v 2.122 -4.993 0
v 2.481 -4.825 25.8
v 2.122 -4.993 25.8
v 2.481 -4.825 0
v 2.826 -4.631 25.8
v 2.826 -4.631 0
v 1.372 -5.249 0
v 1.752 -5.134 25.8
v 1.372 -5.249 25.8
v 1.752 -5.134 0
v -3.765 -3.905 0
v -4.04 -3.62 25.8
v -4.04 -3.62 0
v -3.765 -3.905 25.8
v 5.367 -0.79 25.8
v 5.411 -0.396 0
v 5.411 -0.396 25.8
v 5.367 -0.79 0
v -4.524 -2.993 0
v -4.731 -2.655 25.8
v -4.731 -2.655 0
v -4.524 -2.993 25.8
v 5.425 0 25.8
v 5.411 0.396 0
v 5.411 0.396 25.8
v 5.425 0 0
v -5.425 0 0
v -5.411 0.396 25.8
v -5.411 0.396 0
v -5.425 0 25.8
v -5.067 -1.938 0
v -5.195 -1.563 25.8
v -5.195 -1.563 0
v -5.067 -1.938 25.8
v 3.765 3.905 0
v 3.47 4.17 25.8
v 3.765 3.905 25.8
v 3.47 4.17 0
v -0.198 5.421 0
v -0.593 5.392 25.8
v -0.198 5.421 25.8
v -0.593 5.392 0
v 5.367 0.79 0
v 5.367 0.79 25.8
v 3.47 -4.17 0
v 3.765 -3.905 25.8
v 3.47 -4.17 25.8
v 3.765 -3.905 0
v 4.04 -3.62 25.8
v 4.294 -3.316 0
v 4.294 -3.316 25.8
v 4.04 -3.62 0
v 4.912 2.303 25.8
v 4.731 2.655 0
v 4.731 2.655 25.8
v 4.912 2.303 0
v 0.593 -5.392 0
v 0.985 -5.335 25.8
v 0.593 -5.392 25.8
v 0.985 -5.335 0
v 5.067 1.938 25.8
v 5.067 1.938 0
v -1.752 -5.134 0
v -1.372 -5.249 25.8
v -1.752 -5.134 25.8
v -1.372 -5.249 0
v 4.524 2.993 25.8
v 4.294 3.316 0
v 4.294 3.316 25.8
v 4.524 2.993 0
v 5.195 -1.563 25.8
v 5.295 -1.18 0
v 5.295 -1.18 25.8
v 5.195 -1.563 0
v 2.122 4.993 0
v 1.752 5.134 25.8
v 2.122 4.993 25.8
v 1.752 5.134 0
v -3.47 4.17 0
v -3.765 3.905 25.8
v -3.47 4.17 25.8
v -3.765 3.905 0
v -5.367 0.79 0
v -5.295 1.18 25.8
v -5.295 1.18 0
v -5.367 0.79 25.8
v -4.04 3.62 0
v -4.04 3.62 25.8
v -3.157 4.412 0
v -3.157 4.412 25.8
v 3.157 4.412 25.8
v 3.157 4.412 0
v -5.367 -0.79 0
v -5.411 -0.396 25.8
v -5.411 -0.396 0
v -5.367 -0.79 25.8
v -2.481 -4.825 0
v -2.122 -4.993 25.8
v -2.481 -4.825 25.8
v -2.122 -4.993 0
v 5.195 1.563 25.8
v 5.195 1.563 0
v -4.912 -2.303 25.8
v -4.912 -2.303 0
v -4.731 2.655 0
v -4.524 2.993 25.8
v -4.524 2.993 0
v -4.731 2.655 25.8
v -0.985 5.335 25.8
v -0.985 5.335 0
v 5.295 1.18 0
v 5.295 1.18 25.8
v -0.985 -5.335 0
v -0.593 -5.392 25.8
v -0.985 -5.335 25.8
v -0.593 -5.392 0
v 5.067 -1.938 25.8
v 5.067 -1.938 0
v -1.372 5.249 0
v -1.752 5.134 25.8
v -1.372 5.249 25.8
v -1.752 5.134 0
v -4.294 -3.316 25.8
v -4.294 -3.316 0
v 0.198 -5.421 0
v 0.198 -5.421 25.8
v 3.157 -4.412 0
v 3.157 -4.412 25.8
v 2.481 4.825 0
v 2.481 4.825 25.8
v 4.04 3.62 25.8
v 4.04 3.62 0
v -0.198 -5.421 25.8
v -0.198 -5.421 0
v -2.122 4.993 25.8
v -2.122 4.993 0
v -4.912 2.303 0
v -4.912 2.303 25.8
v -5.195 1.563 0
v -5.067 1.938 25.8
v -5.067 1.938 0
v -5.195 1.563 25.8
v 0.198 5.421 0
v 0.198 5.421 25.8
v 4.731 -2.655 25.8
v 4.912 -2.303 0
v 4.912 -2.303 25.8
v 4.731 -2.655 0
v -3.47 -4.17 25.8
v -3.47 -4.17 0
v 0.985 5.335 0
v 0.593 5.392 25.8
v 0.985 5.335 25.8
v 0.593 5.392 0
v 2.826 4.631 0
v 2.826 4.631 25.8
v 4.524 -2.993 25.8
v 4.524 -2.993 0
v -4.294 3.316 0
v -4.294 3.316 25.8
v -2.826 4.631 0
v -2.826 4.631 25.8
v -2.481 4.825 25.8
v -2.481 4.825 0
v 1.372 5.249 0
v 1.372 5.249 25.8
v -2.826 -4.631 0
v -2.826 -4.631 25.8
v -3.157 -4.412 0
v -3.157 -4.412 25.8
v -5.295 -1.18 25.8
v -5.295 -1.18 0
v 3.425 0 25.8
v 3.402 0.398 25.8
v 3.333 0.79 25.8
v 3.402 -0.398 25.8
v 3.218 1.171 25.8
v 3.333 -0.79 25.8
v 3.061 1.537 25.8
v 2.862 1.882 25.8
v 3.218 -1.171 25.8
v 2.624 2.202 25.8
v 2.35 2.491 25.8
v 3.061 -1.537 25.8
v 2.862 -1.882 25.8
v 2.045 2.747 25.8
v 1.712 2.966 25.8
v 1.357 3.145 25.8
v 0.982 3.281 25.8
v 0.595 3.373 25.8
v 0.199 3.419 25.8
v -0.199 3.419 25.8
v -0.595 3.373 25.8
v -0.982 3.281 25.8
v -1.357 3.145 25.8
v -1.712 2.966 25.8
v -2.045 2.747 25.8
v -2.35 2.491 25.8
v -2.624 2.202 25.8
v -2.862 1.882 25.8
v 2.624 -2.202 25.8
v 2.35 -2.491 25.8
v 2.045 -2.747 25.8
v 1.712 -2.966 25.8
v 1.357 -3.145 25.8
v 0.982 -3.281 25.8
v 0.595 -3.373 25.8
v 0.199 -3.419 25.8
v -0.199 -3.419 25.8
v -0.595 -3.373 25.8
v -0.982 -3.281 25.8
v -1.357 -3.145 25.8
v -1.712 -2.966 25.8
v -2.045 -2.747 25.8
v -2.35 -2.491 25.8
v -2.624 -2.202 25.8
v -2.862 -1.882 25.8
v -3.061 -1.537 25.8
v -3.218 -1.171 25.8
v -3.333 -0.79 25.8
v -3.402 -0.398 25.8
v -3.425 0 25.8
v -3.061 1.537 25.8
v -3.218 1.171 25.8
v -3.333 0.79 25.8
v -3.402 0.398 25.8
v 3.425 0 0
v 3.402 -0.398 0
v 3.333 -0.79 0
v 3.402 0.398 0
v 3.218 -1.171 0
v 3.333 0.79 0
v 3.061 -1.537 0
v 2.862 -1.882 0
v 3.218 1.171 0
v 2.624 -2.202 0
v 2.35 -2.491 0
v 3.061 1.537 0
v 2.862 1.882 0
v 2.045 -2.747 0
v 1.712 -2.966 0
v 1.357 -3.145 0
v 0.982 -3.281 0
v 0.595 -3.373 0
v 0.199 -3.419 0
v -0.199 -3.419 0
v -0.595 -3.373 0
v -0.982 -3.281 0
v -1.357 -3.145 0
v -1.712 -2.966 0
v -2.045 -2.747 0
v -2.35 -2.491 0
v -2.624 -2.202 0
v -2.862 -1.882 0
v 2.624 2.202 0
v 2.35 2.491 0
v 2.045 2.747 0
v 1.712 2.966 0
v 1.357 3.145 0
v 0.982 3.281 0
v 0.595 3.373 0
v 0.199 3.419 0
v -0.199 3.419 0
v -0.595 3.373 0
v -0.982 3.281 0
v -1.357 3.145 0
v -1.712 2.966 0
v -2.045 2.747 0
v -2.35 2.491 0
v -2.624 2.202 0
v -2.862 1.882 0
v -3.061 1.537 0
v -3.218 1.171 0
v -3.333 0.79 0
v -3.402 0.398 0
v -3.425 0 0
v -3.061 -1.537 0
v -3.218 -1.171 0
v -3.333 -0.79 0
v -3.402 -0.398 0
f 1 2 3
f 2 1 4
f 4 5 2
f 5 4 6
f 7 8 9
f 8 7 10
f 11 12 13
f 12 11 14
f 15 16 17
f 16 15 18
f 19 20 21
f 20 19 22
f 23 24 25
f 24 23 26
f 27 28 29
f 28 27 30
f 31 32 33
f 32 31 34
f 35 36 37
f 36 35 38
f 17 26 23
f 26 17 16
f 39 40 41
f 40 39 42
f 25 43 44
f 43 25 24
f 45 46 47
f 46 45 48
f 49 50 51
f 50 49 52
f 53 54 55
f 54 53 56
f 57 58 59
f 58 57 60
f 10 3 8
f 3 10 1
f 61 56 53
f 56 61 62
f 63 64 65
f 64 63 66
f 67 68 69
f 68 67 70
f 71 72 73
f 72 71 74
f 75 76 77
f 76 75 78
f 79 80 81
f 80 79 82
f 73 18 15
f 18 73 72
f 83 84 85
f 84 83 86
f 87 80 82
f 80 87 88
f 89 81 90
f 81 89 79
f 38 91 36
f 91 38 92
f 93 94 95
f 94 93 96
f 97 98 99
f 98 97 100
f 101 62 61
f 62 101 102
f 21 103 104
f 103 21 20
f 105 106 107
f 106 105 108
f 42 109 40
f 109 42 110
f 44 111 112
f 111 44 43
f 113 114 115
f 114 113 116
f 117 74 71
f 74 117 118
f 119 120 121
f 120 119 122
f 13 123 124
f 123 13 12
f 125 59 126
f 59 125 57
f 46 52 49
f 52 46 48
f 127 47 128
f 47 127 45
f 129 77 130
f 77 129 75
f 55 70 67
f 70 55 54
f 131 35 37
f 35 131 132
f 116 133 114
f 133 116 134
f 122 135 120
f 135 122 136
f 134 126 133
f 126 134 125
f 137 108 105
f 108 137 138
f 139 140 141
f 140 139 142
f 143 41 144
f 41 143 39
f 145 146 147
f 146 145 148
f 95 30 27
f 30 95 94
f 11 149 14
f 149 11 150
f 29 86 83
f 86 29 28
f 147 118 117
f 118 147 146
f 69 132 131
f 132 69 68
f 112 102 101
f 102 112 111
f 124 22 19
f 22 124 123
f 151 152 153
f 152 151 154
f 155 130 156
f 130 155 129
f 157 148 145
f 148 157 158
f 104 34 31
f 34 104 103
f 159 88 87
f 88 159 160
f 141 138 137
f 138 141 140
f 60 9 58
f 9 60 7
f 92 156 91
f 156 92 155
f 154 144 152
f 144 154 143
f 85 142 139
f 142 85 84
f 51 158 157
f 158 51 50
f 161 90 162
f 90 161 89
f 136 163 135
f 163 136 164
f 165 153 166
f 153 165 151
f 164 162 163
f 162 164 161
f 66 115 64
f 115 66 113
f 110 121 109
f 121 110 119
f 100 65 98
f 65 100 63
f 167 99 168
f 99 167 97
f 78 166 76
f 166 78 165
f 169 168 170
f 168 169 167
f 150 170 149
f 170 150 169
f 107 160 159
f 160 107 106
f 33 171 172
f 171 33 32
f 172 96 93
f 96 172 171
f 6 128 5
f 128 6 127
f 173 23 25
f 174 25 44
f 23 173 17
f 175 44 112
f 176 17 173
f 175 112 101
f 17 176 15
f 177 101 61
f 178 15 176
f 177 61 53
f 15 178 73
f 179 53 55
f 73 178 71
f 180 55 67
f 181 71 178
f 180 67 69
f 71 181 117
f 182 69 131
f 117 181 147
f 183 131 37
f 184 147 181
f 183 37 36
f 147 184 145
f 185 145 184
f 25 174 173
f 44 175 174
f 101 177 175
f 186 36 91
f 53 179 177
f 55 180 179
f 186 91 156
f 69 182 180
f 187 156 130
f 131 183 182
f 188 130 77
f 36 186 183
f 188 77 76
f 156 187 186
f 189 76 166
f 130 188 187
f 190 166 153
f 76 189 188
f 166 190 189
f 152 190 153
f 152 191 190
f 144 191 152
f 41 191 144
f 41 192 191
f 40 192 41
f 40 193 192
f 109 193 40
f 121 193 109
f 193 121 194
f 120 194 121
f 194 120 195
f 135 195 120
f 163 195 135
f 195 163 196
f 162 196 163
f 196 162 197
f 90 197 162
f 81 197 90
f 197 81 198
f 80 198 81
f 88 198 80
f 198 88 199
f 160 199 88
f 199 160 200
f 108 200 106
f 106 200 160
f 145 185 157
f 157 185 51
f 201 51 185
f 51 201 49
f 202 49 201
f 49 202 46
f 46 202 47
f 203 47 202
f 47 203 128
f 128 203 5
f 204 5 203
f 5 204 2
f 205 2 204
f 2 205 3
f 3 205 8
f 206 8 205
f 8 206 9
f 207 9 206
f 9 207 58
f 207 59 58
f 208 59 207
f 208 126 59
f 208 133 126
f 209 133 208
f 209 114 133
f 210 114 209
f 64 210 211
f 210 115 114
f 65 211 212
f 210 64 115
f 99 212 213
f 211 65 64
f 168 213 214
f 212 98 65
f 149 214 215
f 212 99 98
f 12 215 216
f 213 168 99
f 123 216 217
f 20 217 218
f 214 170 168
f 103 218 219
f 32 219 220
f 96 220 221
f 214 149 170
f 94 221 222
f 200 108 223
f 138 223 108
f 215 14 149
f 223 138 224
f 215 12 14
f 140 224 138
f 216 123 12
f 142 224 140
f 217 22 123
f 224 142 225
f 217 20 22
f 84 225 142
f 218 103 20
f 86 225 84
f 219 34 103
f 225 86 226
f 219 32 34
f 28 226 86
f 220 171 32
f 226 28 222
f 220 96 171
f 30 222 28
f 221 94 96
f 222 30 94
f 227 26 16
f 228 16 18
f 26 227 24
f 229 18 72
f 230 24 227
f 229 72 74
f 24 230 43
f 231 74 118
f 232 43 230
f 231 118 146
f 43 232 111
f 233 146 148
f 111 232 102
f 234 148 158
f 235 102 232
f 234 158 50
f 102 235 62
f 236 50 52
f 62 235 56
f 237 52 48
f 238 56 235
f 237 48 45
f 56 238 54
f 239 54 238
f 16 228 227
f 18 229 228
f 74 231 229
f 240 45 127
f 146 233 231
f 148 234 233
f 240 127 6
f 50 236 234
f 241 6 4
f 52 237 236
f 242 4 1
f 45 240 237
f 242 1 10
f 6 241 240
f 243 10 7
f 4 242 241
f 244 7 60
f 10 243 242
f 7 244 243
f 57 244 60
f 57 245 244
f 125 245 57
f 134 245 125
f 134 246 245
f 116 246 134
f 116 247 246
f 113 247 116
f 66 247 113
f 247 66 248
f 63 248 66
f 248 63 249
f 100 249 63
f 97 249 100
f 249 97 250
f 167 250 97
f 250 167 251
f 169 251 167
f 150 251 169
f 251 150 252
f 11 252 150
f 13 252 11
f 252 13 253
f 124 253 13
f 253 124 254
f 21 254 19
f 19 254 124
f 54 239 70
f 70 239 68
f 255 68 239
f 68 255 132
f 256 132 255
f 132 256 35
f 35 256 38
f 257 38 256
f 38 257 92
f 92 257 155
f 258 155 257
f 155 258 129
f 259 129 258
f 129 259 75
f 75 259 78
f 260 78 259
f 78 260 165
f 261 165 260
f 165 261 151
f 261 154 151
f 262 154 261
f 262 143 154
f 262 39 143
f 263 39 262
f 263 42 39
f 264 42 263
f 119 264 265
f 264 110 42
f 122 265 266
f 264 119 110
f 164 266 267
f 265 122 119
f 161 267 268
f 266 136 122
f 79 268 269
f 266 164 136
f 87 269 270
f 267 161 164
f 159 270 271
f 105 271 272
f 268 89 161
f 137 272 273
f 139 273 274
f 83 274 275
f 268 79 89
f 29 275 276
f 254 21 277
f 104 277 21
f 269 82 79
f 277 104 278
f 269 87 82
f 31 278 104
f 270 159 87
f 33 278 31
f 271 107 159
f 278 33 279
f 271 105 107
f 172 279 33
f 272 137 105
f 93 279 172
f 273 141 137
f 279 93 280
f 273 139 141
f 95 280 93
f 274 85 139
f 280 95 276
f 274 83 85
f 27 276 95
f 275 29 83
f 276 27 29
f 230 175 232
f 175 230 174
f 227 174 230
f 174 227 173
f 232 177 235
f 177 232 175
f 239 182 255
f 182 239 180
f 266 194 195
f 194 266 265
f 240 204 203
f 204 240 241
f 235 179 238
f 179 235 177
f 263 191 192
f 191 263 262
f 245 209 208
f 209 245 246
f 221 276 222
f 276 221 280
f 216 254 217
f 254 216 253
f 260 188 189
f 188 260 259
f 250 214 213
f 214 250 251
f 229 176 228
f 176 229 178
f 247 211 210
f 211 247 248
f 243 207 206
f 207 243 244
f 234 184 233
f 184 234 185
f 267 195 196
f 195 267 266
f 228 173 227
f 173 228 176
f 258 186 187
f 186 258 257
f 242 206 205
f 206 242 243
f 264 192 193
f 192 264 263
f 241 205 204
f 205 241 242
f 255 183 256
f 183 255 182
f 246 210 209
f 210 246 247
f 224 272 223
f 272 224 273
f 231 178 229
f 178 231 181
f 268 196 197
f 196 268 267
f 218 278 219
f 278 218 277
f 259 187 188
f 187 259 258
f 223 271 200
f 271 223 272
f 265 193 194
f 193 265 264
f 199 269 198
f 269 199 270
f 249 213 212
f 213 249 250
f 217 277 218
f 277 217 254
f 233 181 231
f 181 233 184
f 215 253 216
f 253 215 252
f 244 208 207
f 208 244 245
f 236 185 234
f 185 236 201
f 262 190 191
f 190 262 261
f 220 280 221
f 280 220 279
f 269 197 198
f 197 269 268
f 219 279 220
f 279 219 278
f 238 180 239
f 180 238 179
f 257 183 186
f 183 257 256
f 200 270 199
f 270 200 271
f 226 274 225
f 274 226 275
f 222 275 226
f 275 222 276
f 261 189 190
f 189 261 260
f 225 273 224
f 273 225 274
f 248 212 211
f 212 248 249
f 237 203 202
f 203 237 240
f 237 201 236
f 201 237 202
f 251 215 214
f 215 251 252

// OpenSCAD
// ALT SLEEVE -- the shoulder bushing that keeps the altitude axis free.
//
// This tiny part is the reason the mechanism moves at all. The telescope's
// pivot bolt threads into the far bracket's brass insert, so tightening it
// pulls both brackets together and clamps everything between them. If the
// yoke tine were in that clamp path, the altitude axis would be locked
// solid -- and a locked axis is geometrically indistinguishable from a
// working one in any interference or contact check (cad-design rule 6).
//
// The sleeve takes the clamp load instead: it is fractionally LONGER than
// the tine is thick, so the bolt squeezes bracket -> sleeve -> bracket and
// the tine spins free on the sleeve's OD.
//
// Kinematic role: clamped to the TELESCOPE (turns with it). The tine is
// the journal, the sleeve is the shaft.
//
// FRAME: local, axis along +Z, seated at Z=0. This is also its print
// orientation -- upright, so the journal OD comes out round rather than
// elephant-footed on one side.

include <params.scad>

// sleeve_len / _id / _od live in params.scad, NOT here: yoke.scad's journal
// bore is a running fit on sleeve_od, so the number is shared by two parts
// and belongs to neither (rule 3). sleeve_shoulder_gap is what makes the
// sleeve stand proud of the tine -- less and print tolerance eats it, more
// and the telescope rattles on its own pivot.

module alt_sleeve() {
    assert(is_num(yoke_tine_t) && yoke_tine_t > 0,
           "alt_sleeve: params.scad not included, or bracket_gap is bad");
    assert(sleeve_od < bracket_clear_d + 6,
           "alt_sleeve: OD is large relative to the bracket hole -- check that \
the sleeve's ends actually land on bracket material, not on air");

    difference() {
        cylinder(h = sleeve_len, d = sleeve_od);
        translate([0, 0, -1]) cylinder(h = sleeve_len + 2, d = sleeve_id);
    }
}

alt_sleeve();
